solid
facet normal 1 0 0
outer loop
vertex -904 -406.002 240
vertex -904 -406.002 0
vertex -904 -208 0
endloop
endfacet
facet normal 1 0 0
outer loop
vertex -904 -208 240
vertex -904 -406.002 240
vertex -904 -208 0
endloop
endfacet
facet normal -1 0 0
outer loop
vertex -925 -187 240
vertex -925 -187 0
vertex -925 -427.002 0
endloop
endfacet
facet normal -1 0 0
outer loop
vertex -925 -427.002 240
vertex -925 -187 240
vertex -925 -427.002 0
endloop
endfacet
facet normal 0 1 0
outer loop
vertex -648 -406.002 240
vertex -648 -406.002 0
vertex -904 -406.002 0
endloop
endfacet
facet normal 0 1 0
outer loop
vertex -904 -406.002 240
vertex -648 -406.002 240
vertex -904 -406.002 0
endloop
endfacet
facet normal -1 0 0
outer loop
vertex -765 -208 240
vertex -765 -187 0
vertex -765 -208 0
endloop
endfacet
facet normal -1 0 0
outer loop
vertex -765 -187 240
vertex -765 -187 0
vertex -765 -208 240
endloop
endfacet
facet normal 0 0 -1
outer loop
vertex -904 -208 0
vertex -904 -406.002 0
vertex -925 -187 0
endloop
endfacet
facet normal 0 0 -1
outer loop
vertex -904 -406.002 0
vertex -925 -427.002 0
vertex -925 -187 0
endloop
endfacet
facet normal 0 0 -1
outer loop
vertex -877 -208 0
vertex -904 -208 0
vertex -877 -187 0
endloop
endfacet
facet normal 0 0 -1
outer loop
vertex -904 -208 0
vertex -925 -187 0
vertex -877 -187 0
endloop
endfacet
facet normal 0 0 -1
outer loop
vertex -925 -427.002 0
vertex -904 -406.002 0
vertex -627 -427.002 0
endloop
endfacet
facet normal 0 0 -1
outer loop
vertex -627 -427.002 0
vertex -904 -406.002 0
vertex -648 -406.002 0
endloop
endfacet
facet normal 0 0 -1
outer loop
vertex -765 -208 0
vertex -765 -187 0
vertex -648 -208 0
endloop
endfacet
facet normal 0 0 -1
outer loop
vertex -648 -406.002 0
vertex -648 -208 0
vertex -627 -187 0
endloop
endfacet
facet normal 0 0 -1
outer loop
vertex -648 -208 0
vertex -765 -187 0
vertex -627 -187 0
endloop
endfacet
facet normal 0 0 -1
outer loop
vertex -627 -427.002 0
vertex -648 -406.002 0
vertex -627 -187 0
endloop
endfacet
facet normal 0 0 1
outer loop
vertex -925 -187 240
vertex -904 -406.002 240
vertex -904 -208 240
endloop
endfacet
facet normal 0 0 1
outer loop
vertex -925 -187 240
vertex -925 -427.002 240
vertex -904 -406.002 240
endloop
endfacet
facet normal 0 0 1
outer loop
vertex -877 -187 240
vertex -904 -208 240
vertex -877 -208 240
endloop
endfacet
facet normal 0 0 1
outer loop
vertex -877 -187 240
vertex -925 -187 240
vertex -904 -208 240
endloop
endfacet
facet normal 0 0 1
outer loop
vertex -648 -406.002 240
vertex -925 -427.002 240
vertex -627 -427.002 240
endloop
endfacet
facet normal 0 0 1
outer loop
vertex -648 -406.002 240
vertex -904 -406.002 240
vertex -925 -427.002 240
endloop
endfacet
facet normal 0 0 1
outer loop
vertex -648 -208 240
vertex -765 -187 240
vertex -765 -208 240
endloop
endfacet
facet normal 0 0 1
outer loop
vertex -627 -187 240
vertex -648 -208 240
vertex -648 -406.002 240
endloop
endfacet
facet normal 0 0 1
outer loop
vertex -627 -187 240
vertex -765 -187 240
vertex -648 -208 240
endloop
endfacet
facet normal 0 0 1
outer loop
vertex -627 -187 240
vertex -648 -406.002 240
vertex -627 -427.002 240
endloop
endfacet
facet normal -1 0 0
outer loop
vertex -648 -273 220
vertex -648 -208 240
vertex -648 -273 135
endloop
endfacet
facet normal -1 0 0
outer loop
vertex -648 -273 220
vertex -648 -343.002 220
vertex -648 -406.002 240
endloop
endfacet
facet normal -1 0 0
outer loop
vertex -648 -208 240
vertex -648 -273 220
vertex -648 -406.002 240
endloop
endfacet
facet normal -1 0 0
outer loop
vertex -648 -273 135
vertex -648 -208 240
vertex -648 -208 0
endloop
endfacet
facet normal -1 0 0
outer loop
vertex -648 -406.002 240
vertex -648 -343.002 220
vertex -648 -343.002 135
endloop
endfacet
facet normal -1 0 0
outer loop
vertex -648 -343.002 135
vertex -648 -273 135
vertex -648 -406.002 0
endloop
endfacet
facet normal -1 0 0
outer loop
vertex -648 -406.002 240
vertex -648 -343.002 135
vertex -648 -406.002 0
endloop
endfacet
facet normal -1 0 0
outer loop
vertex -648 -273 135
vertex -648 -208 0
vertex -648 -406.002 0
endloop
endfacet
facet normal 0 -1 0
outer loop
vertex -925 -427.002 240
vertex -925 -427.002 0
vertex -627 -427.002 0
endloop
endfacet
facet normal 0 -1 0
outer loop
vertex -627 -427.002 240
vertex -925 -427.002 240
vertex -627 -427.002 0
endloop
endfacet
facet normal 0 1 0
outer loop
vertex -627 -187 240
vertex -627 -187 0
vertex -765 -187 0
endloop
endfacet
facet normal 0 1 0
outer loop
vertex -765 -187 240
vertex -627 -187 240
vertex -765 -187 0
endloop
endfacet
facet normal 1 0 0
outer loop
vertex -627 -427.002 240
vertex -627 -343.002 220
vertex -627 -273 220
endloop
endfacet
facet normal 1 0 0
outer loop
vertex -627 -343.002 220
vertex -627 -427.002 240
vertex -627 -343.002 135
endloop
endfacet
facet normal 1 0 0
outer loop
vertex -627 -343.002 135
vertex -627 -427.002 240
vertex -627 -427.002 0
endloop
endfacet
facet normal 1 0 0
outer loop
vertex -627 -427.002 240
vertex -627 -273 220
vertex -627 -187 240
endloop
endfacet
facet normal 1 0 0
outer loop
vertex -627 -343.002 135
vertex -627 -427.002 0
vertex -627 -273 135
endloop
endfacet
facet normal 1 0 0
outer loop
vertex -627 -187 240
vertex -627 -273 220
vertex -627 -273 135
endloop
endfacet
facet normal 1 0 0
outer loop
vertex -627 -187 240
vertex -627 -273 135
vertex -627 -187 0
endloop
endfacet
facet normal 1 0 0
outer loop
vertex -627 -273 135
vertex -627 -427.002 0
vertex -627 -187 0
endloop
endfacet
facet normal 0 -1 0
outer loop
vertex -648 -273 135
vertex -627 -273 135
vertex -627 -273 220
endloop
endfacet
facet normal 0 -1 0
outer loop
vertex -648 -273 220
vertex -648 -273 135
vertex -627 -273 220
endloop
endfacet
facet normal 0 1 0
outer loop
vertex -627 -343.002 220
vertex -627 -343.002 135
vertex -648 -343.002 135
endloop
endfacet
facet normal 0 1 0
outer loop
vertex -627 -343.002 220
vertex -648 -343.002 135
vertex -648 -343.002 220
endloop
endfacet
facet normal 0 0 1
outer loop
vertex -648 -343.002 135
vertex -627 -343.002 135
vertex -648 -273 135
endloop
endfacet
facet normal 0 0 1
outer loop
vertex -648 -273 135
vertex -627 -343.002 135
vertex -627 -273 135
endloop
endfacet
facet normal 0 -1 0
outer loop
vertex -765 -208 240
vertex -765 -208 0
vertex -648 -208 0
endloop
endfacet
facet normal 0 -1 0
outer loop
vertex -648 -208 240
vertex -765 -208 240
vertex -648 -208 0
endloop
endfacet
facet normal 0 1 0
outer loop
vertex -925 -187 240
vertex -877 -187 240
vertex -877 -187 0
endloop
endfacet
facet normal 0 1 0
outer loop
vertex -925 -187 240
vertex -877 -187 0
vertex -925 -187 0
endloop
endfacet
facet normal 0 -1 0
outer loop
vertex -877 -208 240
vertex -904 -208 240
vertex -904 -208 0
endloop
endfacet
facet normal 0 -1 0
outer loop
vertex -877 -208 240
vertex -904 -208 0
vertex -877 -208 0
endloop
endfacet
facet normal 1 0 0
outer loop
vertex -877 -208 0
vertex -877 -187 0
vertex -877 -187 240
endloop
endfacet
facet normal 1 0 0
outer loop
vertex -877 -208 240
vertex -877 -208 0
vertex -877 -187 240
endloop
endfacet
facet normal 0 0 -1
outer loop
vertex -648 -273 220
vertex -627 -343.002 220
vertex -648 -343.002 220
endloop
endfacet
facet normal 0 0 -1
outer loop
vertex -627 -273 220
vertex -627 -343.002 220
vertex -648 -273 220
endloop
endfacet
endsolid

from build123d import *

# Parameters (mm, degrees)
F3_DEPTH   = 240
F5_DEPTH   = 20
F6_W       = 112
F6_H       = 241.106075
F7_DEPTH   = 25
F8_W       = 70.001994
F8_H       = 85
F9_DEPTH   = 25
F10_W      = 50
F10_H      = 198.001994
F11_DEPTH  = 50
F12_DEPTH  = 25
F11_FACE_W = 50
F11_FACE_H = 198.001994
F13_DEPTH  = 70.001


with BuildPart() as f3:
    # F2 (on face) → F3 (new body)
    with BuildSketch(Plane.XY):
        Polygon((-627, -343.001994), (-627, -273), (-627, -187), (-765, -187), (-877, -187), (-925, -187), (-925, -427.001994), (-627, -427.001994), align=None)
        Polygon((-765, -208), (-648, -208), (-648, -273), (-648, -343.001994), (-648, -406.001994), (-904, -406.001994), (-904, -208), (-877, -208), align=None, mode=Mode.SUBTRACT)
    extrude(amount=F3_DEPTH)

    # F4 (on face) → F5 (join)
    with BuildSketch(Plane.XY):
        Polygon((-648, -273), (-648, -208), (-765, -208), (-877, -208), (-904, -208), (-904, -406.001994), (-648, -406.001994), (-648, -343.001994), align=None)
    extrude(amount=F5_DEPTH)

    # F6 (on face) → F7 (cut)
    with BuildSketch(Plane(origin=(0, -187, 0), x_dir=(-1, 0, 0), z_dir=(0, 1, 0))):
        with Locations((821, 140.553037)):
            Rectangle(F6_W, F6_H)
    extrude(amount=-F7_DEPTH, mode=Mode.SUBTRACT)

    # F8 (on face) → F9 (cut)
    with BuildSketch(Plane.YZ.offset(-627)):
        with Locations((-308.000997, 177.5)):
            Rectangle(F8_W, F8_H)
    extrude(amount=-F9_DEPTH, mode=Mode.SUBTRACT)

    # F10 (on face) → F11 (join)
    with BuildSketch(Plane.XY.offset(20)):
        with Locations((-673, -307.000997)):
            Rectangle(F10_W, F10_H)
    extrude(amount=F11_DEPTH)

    # F7_face (on face) → F12 (cut)
    with BuildSketch(Plane(origin=(-777.995456, -302.145343, 20), x_dir=(1, 0, 0), z_dir=(0, 0, 1))):
        Polygon((12.995456, 115.145343), (-99.004544, 115.145343), (-99.004544, 94.145343), (-126.004544, 94.145343), (-126.004544, -103.856651), (79.995456, -103.856651), (79.995456, 94.145343), (12.995456, 94.145343), align=None)
    extrude(amount=-F12_DEPTH, mode=Mode.SUBTRACT)

    # F11_face (on face) → F13 (cut, through all)
    with BuildSketch(Plane(origin=(-673, -307.000997, 70), x_dir=(1, 0, 0), z_dir=(0, 0, 1))):
        Rectangle(F11_FACE_W, F11_FACE_H)
    extrude(amount=-F13_DEPTH, mode=Mode.SUBTRACT)


solid = f3.part
